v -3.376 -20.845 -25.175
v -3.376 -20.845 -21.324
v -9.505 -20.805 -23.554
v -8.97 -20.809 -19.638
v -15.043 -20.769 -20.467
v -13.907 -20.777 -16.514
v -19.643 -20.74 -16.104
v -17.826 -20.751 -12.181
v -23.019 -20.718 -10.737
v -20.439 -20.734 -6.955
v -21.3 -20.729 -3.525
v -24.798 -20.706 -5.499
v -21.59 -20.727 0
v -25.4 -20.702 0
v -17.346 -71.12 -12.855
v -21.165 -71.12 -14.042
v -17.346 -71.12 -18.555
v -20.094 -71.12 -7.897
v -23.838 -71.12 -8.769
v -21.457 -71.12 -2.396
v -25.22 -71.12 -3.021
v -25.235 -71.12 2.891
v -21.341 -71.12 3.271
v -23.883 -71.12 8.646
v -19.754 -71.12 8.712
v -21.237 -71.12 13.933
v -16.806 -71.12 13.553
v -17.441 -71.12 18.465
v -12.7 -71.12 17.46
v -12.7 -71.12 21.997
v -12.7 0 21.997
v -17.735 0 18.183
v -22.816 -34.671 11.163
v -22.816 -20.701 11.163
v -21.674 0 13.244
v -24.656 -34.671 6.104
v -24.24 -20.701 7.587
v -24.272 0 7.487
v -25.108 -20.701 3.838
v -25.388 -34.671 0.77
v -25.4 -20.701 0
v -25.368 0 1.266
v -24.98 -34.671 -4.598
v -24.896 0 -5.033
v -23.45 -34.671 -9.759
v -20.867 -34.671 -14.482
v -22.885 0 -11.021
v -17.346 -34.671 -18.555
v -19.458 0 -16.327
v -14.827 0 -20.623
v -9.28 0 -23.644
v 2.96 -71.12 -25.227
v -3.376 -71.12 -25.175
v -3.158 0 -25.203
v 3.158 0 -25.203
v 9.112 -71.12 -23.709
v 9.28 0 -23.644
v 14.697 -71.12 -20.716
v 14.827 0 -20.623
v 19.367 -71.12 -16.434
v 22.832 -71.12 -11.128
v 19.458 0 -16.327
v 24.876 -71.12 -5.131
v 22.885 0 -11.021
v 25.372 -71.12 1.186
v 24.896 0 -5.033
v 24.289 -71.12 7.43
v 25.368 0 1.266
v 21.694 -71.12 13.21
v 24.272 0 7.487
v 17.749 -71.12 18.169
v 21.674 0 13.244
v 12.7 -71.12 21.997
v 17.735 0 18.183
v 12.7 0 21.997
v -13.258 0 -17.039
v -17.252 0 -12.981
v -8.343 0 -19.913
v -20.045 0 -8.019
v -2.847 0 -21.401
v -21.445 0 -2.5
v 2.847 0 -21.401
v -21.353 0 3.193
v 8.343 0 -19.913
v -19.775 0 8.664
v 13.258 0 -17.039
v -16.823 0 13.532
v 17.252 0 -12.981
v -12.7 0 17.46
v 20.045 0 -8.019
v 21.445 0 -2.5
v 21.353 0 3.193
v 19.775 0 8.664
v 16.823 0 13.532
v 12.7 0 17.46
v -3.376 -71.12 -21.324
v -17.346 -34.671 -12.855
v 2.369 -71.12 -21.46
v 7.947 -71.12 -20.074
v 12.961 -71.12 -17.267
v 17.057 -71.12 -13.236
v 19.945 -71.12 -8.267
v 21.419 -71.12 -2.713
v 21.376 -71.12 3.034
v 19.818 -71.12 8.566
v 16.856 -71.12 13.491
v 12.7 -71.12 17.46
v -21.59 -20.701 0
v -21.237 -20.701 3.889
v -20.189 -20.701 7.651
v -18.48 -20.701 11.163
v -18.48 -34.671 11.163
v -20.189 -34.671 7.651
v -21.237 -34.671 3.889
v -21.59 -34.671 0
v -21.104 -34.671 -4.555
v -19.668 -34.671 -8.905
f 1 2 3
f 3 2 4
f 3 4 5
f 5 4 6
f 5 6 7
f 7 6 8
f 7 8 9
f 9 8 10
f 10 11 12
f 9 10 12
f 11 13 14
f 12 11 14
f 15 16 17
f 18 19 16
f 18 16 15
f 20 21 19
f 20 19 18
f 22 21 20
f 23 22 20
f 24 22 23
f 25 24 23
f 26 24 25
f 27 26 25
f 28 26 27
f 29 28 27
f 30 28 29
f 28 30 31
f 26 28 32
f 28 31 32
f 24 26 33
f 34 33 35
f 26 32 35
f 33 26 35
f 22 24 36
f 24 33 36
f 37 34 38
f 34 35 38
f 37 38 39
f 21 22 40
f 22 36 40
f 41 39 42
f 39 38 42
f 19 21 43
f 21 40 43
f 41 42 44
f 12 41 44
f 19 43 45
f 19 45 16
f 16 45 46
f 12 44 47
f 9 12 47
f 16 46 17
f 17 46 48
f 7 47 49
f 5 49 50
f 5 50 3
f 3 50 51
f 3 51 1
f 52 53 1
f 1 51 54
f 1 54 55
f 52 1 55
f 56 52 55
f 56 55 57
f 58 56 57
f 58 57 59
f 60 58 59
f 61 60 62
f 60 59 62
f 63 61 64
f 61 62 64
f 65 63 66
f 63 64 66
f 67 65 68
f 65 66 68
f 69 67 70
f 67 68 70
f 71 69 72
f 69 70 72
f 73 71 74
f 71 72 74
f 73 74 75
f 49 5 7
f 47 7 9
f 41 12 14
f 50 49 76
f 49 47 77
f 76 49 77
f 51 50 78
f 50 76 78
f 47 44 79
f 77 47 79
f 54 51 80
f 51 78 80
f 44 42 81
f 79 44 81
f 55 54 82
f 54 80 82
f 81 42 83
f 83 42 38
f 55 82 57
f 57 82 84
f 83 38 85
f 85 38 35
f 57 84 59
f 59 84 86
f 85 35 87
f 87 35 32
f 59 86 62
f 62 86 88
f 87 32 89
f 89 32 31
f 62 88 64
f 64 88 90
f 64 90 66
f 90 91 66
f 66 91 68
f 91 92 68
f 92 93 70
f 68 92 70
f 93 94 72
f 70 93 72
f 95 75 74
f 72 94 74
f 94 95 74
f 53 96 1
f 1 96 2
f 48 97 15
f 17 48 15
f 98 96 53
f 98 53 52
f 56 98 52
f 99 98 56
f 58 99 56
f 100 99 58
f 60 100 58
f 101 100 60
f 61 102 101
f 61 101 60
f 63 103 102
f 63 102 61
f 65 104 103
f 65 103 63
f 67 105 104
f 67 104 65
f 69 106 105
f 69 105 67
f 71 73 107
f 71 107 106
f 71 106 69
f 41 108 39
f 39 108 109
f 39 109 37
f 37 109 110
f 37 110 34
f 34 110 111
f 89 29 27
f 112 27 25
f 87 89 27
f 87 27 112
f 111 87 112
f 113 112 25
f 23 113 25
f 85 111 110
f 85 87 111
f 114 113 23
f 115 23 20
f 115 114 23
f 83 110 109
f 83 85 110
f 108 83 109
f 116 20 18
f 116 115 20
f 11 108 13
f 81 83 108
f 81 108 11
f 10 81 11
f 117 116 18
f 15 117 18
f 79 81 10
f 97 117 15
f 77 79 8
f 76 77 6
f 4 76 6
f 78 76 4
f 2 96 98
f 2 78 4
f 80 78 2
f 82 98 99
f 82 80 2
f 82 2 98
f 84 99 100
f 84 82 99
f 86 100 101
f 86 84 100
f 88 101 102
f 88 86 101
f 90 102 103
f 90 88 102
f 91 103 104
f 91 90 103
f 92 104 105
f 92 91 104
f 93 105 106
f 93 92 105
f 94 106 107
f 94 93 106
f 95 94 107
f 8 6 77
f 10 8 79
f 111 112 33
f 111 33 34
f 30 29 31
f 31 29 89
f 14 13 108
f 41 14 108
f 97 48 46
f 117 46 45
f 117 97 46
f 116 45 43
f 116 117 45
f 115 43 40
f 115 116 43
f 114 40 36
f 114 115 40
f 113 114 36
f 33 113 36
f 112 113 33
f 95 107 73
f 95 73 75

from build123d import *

# Parameters (mm, degrees)
F0_R     = 25.4
F0_R_2   = 21.59
F1_DEPTH = 71.12
F3_DEPTH = 25.4
F4_W     = 13.97
F4_H     = 11.162907
F5_DEPTH = 25.4
F6_W     = 25.4
F6_H     = 71.12
F7_DEPTH = 25.4


with BuildPart() as f1:
    # F0 (on Front) → F1 (new body)
    with BuildSketch(Plane.XZ):
        Circle(F0_R)
        Circle(F0_R_2, mode=Mode.SUBTRACT)
    extrude(amount=F1_DEPTH)

    # F2 (on Top) → F3 (cut)
    with BuildSketch(Plane.XY):
        Polygon((-17.346008, -34.671), (-17.346008, -71.12), (-3.376008, -71.12), (-3.376008, -34.671), (-3.376008, -20.844901), (-25.586616, -20.701003), (-25.596492, -34.671), align=None)
    extrude(amount=-F3_DEPTH, mode=Mode.SUBTRACT)

    # F4 (on Right) → F5 (cut)
    with BuildSketch(Plane.YZ):
        with Locations((-27.686, 5.581453)):
            Rectangle(F4_W, F4_H)
    extrude(amount=-F5_DEPTH, mode=Mode.SUBTRACT)

    # F6 (on Top) → F7 (cut)
    with BuildSketch(Plane.XY):
        with Locations((0, -35.56)):
            Rectangle(F6_W, F6_H)
    extrude(amount=F7_DEPTH, mode=Mode.SUBTRACT)


solid = f1.part
